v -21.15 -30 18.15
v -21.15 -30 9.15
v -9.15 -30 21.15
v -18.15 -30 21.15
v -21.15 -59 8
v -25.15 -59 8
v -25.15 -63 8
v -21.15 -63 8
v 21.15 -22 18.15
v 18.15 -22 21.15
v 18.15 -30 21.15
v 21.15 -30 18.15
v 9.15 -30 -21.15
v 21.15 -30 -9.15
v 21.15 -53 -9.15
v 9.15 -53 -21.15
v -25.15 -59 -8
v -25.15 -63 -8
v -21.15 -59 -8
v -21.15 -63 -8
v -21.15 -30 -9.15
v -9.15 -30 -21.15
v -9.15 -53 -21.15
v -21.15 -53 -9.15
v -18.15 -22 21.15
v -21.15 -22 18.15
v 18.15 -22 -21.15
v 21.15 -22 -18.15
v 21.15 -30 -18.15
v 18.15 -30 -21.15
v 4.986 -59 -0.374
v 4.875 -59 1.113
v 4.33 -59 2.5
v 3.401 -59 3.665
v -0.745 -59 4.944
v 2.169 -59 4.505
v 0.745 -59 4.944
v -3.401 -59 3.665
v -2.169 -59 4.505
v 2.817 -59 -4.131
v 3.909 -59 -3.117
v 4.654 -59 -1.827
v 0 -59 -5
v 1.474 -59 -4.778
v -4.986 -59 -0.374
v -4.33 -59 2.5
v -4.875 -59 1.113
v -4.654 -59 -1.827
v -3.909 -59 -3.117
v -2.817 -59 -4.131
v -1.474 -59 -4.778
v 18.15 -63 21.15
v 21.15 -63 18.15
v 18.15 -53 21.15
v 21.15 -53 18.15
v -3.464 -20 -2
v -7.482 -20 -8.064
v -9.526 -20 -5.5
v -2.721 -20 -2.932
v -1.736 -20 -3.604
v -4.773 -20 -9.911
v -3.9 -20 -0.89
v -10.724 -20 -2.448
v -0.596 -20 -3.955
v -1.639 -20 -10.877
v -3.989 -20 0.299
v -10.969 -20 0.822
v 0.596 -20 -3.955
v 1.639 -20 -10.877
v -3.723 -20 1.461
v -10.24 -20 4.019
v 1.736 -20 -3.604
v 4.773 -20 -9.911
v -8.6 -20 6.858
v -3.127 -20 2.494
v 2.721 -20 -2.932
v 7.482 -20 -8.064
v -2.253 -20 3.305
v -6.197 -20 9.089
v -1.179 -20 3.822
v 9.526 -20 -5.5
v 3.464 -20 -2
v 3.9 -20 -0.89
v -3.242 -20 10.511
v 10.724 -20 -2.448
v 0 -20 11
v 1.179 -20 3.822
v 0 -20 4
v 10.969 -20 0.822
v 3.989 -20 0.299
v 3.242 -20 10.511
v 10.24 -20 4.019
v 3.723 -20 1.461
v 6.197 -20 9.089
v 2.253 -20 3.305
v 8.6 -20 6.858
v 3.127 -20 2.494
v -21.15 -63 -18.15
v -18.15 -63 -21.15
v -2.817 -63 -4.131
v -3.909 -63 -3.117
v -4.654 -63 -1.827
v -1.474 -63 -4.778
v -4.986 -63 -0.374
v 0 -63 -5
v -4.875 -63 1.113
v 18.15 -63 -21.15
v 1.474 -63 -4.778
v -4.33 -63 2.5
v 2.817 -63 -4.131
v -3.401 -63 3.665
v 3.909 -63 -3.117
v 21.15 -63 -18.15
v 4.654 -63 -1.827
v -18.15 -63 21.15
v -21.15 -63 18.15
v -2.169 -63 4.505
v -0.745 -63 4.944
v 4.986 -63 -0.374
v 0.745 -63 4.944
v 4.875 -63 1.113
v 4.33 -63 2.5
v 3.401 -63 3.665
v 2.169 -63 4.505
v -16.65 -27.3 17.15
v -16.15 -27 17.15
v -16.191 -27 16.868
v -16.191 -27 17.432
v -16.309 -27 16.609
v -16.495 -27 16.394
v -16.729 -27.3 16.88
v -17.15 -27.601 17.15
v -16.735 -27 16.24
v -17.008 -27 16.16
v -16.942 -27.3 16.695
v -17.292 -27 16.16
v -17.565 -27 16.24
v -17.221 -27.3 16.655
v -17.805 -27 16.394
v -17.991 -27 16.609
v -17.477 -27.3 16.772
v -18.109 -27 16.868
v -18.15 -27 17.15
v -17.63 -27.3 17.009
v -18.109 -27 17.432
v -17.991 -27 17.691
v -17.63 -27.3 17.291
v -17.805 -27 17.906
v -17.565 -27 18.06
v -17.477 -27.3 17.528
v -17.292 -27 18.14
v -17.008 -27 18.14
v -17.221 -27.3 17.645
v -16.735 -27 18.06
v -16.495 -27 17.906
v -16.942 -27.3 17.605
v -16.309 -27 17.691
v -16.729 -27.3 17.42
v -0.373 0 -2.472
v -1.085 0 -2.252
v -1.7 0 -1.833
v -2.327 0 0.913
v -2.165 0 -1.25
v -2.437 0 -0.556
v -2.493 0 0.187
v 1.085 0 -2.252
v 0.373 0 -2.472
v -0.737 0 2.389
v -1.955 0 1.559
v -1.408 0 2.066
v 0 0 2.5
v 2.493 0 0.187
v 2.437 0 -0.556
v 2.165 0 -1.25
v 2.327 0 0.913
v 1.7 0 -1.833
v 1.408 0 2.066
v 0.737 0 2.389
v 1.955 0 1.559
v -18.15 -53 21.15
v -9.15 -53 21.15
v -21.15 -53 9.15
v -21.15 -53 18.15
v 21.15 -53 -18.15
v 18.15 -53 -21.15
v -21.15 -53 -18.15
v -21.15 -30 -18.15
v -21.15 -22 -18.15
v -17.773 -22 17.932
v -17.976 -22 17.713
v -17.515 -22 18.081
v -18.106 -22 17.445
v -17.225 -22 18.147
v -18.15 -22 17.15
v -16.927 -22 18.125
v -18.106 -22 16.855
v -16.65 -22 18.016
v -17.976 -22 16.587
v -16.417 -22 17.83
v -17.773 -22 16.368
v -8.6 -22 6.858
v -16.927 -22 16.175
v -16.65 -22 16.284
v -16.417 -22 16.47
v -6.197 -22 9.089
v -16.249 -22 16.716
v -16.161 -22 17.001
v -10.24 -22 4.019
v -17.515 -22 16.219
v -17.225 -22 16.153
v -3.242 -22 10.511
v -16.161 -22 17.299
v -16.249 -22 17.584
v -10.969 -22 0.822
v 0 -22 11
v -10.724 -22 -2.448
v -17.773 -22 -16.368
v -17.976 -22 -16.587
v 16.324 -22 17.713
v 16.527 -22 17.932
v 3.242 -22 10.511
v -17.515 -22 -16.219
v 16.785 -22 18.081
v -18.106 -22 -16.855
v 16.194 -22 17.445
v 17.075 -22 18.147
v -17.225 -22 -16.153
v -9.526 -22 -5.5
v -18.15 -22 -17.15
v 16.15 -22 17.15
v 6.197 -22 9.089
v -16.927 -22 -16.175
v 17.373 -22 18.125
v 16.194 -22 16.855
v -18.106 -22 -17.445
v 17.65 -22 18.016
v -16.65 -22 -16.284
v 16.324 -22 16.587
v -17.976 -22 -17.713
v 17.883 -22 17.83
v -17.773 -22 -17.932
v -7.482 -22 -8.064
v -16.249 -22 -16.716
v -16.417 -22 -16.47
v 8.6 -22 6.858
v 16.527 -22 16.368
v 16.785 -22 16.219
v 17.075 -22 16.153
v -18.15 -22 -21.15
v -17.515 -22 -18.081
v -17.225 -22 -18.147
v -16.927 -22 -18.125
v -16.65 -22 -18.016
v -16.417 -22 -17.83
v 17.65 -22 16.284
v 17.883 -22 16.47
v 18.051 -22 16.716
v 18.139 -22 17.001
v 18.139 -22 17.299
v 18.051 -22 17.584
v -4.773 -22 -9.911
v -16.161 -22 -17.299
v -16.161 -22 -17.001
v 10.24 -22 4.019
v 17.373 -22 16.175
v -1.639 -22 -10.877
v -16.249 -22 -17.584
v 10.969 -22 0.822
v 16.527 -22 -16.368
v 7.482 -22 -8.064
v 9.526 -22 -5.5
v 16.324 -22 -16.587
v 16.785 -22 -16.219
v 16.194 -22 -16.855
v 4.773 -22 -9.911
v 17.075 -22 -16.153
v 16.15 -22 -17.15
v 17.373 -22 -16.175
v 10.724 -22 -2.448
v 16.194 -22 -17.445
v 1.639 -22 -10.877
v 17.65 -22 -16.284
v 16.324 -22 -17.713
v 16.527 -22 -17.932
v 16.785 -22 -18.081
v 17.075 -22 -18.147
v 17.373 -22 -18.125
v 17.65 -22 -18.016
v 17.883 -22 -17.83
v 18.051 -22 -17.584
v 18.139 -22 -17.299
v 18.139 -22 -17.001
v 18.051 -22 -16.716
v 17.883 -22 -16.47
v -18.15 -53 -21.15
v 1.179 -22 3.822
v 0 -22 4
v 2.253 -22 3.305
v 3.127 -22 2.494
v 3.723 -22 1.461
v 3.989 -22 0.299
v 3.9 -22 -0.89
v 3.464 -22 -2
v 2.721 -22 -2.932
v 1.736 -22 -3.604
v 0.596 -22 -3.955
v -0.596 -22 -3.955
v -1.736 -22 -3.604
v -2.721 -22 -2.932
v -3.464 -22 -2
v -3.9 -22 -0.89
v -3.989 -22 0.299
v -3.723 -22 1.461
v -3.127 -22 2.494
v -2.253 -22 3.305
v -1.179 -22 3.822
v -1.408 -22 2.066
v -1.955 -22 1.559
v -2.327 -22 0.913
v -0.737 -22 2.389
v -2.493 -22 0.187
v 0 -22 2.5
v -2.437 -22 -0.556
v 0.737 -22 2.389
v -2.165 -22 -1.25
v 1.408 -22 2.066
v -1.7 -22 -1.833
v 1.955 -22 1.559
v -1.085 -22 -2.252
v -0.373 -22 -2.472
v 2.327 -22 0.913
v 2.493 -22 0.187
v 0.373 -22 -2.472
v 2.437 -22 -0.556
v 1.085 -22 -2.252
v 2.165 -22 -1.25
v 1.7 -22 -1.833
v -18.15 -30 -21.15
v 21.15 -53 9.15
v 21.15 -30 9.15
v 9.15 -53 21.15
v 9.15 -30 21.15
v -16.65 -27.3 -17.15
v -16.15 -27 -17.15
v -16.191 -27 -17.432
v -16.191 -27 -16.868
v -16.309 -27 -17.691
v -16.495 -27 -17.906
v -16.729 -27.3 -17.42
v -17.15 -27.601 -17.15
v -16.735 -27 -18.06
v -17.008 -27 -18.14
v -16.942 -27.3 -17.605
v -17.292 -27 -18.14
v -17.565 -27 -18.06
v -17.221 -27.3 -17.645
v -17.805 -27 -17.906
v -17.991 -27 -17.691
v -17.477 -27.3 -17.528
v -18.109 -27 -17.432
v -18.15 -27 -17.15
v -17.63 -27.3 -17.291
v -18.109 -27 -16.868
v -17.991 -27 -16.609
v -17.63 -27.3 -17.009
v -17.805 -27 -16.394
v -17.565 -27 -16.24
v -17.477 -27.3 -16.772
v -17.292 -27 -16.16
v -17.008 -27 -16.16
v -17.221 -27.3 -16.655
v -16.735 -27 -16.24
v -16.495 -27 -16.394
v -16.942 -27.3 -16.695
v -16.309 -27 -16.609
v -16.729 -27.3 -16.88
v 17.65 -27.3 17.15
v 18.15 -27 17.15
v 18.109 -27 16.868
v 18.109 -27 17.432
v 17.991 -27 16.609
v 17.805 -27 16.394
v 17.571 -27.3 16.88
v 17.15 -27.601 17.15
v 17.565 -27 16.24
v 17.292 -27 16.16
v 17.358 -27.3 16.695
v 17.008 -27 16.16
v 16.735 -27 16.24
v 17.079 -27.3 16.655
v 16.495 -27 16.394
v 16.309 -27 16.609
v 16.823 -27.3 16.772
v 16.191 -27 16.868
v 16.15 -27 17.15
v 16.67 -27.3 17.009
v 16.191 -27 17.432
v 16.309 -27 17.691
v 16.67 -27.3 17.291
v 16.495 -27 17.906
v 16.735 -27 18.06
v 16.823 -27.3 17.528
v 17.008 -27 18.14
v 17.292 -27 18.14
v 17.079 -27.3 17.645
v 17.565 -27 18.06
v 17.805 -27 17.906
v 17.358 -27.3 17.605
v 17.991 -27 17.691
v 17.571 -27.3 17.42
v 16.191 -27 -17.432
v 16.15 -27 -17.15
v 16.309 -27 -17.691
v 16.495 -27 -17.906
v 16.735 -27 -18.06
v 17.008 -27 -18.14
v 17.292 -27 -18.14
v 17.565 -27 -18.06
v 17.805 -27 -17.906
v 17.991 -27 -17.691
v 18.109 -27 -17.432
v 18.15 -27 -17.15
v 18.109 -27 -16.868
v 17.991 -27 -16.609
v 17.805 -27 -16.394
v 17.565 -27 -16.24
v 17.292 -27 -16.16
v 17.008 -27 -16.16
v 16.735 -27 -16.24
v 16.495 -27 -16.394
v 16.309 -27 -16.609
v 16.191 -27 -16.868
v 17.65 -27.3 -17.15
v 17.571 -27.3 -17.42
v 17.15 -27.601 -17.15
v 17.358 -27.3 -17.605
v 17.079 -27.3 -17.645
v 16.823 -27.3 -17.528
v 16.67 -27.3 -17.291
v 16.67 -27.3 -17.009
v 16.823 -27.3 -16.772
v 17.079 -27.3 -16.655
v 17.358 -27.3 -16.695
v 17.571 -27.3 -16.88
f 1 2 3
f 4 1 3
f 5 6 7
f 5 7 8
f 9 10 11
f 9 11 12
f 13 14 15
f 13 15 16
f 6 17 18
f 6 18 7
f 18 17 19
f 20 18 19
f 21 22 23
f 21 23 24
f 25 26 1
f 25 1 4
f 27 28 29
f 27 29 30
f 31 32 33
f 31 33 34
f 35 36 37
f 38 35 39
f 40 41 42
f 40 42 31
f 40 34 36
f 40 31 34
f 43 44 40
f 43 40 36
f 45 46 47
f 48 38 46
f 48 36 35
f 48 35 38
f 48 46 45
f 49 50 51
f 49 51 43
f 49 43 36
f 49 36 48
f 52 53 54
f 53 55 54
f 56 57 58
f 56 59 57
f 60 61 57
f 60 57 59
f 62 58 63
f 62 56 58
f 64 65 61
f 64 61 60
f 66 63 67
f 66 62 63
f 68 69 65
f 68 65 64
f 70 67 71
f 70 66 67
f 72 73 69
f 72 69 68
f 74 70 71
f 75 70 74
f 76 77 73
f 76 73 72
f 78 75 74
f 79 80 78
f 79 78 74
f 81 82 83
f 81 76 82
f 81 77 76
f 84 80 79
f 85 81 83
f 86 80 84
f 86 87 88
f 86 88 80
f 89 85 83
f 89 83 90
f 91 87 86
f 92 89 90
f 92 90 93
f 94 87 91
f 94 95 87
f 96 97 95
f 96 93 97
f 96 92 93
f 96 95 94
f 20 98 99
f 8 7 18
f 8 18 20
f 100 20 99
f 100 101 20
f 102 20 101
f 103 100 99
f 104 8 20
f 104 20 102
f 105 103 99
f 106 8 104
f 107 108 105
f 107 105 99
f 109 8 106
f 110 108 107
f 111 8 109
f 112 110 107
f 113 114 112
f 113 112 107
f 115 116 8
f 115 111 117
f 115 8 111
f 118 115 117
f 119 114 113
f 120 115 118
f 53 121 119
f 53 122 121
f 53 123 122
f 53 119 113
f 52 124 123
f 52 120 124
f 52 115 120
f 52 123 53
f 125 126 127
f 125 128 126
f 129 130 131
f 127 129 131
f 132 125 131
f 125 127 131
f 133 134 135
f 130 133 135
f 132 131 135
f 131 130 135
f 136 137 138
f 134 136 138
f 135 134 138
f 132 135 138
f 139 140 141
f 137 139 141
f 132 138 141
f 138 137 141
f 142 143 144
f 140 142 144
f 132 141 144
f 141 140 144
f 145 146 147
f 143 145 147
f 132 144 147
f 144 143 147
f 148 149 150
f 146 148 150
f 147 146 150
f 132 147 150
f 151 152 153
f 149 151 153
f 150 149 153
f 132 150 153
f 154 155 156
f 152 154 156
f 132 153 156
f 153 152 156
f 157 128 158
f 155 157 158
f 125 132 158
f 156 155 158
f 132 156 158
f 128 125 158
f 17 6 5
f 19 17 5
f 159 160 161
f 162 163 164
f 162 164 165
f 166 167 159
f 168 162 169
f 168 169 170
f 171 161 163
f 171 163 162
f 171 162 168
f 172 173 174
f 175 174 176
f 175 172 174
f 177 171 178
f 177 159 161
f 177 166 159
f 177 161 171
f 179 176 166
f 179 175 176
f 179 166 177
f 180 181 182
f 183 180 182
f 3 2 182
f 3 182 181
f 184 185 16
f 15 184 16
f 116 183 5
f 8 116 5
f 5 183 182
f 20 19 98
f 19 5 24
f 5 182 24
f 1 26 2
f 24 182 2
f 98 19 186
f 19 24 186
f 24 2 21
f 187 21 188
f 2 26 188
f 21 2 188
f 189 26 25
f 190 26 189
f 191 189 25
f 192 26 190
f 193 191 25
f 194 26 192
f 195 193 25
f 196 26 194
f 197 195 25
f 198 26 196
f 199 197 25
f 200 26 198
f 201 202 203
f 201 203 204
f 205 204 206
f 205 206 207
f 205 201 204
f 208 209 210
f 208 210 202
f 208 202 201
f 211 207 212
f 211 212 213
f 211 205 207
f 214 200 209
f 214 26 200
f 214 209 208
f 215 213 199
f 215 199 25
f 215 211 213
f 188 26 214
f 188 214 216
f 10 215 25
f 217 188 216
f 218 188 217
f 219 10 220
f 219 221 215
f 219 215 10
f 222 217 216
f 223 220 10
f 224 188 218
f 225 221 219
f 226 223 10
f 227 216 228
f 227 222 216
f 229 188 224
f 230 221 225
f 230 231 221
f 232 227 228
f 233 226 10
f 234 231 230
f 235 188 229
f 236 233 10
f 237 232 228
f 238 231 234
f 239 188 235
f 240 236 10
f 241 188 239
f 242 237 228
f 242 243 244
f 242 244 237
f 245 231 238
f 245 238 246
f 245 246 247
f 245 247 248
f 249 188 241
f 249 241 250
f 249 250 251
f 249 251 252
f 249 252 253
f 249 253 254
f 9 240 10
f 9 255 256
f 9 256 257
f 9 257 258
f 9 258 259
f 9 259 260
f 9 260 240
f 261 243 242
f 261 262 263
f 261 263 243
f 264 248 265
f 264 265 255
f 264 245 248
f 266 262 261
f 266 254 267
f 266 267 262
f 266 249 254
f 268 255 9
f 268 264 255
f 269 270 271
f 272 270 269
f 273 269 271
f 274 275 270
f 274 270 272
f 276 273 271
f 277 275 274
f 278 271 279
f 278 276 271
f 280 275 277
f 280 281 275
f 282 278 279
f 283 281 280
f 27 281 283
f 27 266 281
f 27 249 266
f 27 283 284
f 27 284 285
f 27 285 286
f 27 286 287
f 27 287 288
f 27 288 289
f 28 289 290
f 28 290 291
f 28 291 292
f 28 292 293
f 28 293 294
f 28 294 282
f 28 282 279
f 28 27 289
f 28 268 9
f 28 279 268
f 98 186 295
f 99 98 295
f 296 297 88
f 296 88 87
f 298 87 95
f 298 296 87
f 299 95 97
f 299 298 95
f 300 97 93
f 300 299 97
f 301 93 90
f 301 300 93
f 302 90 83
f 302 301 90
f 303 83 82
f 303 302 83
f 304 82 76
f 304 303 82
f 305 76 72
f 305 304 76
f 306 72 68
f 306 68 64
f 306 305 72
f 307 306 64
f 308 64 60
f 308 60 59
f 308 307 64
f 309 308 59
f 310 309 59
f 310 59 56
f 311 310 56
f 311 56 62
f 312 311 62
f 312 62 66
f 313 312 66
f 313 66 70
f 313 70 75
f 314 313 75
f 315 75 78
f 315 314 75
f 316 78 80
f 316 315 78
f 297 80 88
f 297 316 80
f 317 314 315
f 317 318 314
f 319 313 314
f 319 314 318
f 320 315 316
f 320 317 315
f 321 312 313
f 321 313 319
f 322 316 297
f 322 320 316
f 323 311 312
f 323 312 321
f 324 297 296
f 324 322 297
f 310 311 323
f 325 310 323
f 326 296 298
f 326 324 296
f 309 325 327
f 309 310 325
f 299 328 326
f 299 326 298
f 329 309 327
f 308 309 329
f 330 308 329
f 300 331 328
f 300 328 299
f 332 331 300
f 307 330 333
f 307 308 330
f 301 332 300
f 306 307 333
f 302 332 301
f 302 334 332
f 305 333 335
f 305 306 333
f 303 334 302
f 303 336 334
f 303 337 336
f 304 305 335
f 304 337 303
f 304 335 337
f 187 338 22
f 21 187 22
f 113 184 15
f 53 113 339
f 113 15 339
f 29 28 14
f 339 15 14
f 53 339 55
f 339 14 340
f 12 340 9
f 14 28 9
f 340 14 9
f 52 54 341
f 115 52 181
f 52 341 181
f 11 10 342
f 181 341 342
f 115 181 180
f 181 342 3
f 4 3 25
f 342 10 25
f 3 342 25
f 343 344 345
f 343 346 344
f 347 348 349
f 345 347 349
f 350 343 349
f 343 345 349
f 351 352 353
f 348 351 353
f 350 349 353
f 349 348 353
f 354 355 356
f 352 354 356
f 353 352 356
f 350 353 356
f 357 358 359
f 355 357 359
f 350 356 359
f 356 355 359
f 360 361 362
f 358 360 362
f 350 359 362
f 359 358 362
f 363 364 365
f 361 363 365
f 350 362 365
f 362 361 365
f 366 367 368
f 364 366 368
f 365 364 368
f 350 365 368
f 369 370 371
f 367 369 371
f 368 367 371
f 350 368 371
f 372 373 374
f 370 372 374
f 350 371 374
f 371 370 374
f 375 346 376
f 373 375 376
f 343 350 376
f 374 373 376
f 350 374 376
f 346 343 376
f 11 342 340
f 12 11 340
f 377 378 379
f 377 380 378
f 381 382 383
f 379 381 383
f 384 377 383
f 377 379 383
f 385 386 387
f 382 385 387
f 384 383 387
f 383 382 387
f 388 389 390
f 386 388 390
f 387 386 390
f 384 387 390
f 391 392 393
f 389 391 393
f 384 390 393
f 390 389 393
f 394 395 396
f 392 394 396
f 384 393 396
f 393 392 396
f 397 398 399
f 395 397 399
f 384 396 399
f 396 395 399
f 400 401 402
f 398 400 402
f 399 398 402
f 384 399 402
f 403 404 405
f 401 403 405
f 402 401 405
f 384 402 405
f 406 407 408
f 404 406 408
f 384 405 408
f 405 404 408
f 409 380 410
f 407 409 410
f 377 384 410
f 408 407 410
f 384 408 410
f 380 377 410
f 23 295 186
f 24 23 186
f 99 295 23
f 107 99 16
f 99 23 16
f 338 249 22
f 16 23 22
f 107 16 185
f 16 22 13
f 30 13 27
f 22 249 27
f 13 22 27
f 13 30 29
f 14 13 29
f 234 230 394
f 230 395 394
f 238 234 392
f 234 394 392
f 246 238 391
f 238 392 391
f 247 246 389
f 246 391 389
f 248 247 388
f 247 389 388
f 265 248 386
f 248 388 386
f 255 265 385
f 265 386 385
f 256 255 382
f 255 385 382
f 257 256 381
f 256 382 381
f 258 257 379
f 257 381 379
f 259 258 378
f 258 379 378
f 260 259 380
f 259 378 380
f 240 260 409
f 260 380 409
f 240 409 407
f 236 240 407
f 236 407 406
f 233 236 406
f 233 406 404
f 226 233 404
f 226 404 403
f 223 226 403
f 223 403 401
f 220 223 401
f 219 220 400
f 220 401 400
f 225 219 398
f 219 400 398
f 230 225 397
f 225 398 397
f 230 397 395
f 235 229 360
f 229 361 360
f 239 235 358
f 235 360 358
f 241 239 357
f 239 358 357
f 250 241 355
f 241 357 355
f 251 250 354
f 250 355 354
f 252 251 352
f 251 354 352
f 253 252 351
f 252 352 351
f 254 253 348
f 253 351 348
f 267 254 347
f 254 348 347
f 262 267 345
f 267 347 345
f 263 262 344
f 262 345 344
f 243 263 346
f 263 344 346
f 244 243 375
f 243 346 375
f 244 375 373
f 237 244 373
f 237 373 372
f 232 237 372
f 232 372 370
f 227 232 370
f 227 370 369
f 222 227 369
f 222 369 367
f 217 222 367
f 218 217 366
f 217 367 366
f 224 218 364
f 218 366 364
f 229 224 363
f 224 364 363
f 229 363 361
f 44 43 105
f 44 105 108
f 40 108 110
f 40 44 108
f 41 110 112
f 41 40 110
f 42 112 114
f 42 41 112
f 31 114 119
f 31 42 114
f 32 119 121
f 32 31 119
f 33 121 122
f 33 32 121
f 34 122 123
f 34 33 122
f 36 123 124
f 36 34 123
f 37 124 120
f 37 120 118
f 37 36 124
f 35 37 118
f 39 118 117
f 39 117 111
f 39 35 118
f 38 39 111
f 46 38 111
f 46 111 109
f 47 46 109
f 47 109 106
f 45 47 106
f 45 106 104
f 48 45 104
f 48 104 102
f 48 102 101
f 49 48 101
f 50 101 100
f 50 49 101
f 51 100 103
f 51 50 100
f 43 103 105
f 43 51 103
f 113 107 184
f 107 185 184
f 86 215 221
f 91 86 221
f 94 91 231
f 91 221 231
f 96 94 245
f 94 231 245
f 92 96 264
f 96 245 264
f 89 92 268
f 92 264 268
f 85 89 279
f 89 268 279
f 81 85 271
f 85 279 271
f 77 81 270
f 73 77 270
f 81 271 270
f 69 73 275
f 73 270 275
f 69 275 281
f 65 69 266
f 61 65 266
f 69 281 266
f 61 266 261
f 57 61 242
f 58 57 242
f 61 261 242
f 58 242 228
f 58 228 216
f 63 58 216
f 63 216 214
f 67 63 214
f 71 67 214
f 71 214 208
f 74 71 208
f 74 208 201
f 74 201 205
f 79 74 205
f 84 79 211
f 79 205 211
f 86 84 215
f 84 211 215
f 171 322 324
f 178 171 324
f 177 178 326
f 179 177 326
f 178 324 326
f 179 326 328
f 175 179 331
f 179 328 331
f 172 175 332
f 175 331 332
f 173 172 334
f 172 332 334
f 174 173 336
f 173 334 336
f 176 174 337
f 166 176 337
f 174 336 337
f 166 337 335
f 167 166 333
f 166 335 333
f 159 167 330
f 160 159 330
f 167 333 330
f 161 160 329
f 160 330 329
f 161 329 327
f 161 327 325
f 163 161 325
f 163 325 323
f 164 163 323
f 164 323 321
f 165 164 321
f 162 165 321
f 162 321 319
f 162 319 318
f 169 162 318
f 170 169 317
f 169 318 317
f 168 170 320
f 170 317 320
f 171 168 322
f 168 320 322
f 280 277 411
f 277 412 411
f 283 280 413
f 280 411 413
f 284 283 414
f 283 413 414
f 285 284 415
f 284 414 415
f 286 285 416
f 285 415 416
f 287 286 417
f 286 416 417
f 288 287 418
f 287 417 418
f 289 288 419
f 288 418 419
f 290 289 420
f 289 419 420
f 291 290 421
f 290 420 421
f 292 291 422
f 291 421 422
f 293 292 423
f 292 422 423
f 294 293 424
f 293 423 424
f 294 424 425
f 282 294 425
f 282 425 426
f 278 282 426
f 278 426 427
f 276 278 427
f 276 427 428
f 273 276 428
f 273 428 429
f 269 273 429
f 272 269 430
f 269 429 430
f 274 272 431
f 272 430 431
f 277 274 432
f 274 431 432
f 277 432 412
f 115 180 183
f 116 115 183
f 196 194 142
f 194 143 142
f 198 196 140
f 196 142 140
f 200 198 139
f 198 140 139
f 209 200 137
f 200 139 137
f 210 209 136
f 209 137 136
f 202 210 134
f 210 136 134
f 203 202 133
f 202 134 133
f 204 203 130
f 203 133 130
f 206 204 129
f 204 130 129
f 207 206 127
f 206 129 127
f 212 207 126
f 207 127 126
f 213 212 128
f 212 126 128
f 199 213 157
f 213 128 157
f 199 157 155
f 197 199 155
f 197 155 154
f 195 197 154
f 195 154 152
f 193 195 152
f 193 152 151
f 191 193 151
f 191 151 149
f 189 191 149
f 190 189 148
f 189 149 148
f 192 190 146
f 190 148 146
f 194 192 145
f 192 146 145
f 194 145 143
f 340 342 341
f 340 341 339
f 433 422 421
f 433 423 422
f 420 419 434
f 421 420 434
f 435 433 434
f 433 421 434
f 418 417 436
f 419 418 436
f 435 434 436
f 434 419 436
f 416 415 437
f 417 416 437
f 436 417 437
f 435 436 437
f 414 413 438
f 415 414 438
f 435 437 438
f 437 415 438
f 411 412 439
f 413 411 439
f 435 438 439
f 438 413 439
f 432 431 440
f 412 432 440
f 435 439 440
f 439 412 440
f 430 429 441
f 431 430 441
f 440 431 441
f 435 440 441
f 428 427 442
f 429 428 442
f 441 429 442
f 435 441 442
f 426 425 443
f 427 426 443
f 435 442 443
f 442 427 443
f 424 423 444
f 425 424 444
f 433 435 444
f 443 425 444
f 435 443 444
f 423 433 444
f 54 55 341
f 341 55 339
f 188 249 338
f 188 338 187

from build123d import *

# Parameters (mm, degrees)
BOSS_EXTRUDE1_START       = -22
BOSS_EXTRUDE1_DEPTH       = 8
BOSS_EXTRUDE3_DEPTH       = 23
BOSS_EXTRUDE4_DEPTH       = 6
SKETCH4_R                 = 11
SKETCH4_R_2               = 4
BOSS_EXTRUDE5_DEPTH       = 2
SKETCH5_R                 = 2.5
BOSS_EXTRUDE6_DEPTH       = 22
F_2_0MM_DOWEL_HOLE1_D     = 2
F_2_0MM_DOWEL_HOLE1_DEPTH = 5
F_2_0MM_DOWEL_HOLE1_TIP   = 0.600860619
SKETCH8_R                 = 5
SKETCH8_W                 = 4
SKETCH8_H                 = 16
BOSS_EXTRUDE7_DEPTH       = 4


with BuildPart() as part:
    # Sketch1 → Boss-Extrude1 (new body)
    with BuildSketch(Plane(origin=(0, 0, 0), x_dir=(1, 0, 0), z_dir=(0, 1, 0)).offset(BOSS_EXTRUDE1_START)):
        Polygon((-18.15, 21.15), (-21.15, 18.15), (-21.15, -18.15), (-18.15, -21.15), (18.15, -21.15), (21.15, -18.15), (21.15, 18.15), (18.15, 21.15), align=None)
    extrude(amount=-BOSS_EXTRUDE1_DEPTH)

    # Sketch2 → Boss-Extrude3 (add)
    with BuildSketch(Plane(origin=(0, -30, 0), x_dir=(-1, 0, 0), z_dir=(0, -1, 0))):
        Polygon((-21.15, 9.15), (-9.15, 21.15), (9.15, 21.15), (21.15, 9.15), (21.15, -9.15), (9.15, -21.15), (-9.15, -21.15), (-21.15, -9.15), align=None)
    extrude(amount=BOSS_EXTRUDE3_DEPTH)

    # Sketch3 → Boss-Extrude4 (add)
    with BuildSketch(Plane(origin=(0, -53, 0), x_dir=(-1, 0, 0), z_dir=(0, -1, 0))):
        Polygon((-18.15, 21.15), (-21.15, 18.15), (-21.15, -18.15), (-18.15, -21.15), (18.15, -21.15), (21.15, -18.15), (21.15, 18.15), (18.15, 21.15), align=None)
    extrude(amount=BOSS_EXTRUDE4_DEPTH)

    # Sketch4 → Boss-Extrude5 (add)
    with BuildSketch(Plane(origin=(0, -22, 0), x_dir=(-1, 0, 0), z_dir=(0, 1, 0))):
        with Locations(Location((0, 0, 0), (0, 0, 90))):
            Circle(SKETCH4_R)
        with Locations(Location((0, 0, 0), (0, 0, 90))):
            Circle(SKETCH4_R_2, mode=Mode.SUBTRACT)
    extrude(amount=BOSS_EXTRUDE5_DEPTH)

    # Sketch5 → Boss-Extrude6 (add)
    with BuildSketch(Plane(origin=(0, -22, 0), x_dir=(-1, 0, 0), z_dir=(0, 1, 0))):
        with Locations(Location((0, 0, 0), (0, 0, 90))):
            Circle(SKETCH5_R)
    extrude(amount=BOSS_EXTRUDE6_DEPTH)

    # Ø2.0mm Dowel Hole1
    with Locations(Plane(origin=(0, -22, 0), x_dir=(1, 0, 0), z_dir=(0, 1, 0))):
        with Locations((-17.15, 17.15), (-17.15, -17.15), (17.15, -17.15), (17.15, 17.15)):
            Hole(F_2_0MM_DOWEL_HOLE1_D / 2, depth=F_2_0MM_DOWEL_HOLE1_DEPTH)
            with Locations((0, 0, -(F_2_0MM_DOWEL_HOLE1_DEPTH + F_2_0MM_DOWEL_HOLE1_TIP / 2))):  # 118° drill point
                Cone(0, F_2_0MM_DOWEL_HOLE1_D / 2, F_2_0MM_DOWEL_HOLE1_TIP, mode=Mode.SUBTRACT)

    # Sketch8 → Boss-Extrude7 (add)
    # profile 1 of 2: a face of its own
    with BuildSketch(Plane.XZ.offset(59)):
        Polygon((-21.15, -18.15), (-18.15, -21.15), (18.15, -21.15), (21.15, -18.15), (21.15, 18.15), (18.15, 21.15), (-18.15, 21.15), (-21.15, 18.15), align=None)
        with Locations(Location((0, 0, 0), (0, 0, 270))):
            Circle(SKETCH8_R, mode=Mode.SUBTRACT)
    # profile 2 of 2: a face of its own
    with BuildSketch(Plane.XZ.offset(59)):
        with Locations((-23.15, 0)):
            Rectangle(SKETCH8_W, SKETCH8_H)
    extrude(amount=BOSS_EXTRUDE7_DEPTH)


solid = part.part
